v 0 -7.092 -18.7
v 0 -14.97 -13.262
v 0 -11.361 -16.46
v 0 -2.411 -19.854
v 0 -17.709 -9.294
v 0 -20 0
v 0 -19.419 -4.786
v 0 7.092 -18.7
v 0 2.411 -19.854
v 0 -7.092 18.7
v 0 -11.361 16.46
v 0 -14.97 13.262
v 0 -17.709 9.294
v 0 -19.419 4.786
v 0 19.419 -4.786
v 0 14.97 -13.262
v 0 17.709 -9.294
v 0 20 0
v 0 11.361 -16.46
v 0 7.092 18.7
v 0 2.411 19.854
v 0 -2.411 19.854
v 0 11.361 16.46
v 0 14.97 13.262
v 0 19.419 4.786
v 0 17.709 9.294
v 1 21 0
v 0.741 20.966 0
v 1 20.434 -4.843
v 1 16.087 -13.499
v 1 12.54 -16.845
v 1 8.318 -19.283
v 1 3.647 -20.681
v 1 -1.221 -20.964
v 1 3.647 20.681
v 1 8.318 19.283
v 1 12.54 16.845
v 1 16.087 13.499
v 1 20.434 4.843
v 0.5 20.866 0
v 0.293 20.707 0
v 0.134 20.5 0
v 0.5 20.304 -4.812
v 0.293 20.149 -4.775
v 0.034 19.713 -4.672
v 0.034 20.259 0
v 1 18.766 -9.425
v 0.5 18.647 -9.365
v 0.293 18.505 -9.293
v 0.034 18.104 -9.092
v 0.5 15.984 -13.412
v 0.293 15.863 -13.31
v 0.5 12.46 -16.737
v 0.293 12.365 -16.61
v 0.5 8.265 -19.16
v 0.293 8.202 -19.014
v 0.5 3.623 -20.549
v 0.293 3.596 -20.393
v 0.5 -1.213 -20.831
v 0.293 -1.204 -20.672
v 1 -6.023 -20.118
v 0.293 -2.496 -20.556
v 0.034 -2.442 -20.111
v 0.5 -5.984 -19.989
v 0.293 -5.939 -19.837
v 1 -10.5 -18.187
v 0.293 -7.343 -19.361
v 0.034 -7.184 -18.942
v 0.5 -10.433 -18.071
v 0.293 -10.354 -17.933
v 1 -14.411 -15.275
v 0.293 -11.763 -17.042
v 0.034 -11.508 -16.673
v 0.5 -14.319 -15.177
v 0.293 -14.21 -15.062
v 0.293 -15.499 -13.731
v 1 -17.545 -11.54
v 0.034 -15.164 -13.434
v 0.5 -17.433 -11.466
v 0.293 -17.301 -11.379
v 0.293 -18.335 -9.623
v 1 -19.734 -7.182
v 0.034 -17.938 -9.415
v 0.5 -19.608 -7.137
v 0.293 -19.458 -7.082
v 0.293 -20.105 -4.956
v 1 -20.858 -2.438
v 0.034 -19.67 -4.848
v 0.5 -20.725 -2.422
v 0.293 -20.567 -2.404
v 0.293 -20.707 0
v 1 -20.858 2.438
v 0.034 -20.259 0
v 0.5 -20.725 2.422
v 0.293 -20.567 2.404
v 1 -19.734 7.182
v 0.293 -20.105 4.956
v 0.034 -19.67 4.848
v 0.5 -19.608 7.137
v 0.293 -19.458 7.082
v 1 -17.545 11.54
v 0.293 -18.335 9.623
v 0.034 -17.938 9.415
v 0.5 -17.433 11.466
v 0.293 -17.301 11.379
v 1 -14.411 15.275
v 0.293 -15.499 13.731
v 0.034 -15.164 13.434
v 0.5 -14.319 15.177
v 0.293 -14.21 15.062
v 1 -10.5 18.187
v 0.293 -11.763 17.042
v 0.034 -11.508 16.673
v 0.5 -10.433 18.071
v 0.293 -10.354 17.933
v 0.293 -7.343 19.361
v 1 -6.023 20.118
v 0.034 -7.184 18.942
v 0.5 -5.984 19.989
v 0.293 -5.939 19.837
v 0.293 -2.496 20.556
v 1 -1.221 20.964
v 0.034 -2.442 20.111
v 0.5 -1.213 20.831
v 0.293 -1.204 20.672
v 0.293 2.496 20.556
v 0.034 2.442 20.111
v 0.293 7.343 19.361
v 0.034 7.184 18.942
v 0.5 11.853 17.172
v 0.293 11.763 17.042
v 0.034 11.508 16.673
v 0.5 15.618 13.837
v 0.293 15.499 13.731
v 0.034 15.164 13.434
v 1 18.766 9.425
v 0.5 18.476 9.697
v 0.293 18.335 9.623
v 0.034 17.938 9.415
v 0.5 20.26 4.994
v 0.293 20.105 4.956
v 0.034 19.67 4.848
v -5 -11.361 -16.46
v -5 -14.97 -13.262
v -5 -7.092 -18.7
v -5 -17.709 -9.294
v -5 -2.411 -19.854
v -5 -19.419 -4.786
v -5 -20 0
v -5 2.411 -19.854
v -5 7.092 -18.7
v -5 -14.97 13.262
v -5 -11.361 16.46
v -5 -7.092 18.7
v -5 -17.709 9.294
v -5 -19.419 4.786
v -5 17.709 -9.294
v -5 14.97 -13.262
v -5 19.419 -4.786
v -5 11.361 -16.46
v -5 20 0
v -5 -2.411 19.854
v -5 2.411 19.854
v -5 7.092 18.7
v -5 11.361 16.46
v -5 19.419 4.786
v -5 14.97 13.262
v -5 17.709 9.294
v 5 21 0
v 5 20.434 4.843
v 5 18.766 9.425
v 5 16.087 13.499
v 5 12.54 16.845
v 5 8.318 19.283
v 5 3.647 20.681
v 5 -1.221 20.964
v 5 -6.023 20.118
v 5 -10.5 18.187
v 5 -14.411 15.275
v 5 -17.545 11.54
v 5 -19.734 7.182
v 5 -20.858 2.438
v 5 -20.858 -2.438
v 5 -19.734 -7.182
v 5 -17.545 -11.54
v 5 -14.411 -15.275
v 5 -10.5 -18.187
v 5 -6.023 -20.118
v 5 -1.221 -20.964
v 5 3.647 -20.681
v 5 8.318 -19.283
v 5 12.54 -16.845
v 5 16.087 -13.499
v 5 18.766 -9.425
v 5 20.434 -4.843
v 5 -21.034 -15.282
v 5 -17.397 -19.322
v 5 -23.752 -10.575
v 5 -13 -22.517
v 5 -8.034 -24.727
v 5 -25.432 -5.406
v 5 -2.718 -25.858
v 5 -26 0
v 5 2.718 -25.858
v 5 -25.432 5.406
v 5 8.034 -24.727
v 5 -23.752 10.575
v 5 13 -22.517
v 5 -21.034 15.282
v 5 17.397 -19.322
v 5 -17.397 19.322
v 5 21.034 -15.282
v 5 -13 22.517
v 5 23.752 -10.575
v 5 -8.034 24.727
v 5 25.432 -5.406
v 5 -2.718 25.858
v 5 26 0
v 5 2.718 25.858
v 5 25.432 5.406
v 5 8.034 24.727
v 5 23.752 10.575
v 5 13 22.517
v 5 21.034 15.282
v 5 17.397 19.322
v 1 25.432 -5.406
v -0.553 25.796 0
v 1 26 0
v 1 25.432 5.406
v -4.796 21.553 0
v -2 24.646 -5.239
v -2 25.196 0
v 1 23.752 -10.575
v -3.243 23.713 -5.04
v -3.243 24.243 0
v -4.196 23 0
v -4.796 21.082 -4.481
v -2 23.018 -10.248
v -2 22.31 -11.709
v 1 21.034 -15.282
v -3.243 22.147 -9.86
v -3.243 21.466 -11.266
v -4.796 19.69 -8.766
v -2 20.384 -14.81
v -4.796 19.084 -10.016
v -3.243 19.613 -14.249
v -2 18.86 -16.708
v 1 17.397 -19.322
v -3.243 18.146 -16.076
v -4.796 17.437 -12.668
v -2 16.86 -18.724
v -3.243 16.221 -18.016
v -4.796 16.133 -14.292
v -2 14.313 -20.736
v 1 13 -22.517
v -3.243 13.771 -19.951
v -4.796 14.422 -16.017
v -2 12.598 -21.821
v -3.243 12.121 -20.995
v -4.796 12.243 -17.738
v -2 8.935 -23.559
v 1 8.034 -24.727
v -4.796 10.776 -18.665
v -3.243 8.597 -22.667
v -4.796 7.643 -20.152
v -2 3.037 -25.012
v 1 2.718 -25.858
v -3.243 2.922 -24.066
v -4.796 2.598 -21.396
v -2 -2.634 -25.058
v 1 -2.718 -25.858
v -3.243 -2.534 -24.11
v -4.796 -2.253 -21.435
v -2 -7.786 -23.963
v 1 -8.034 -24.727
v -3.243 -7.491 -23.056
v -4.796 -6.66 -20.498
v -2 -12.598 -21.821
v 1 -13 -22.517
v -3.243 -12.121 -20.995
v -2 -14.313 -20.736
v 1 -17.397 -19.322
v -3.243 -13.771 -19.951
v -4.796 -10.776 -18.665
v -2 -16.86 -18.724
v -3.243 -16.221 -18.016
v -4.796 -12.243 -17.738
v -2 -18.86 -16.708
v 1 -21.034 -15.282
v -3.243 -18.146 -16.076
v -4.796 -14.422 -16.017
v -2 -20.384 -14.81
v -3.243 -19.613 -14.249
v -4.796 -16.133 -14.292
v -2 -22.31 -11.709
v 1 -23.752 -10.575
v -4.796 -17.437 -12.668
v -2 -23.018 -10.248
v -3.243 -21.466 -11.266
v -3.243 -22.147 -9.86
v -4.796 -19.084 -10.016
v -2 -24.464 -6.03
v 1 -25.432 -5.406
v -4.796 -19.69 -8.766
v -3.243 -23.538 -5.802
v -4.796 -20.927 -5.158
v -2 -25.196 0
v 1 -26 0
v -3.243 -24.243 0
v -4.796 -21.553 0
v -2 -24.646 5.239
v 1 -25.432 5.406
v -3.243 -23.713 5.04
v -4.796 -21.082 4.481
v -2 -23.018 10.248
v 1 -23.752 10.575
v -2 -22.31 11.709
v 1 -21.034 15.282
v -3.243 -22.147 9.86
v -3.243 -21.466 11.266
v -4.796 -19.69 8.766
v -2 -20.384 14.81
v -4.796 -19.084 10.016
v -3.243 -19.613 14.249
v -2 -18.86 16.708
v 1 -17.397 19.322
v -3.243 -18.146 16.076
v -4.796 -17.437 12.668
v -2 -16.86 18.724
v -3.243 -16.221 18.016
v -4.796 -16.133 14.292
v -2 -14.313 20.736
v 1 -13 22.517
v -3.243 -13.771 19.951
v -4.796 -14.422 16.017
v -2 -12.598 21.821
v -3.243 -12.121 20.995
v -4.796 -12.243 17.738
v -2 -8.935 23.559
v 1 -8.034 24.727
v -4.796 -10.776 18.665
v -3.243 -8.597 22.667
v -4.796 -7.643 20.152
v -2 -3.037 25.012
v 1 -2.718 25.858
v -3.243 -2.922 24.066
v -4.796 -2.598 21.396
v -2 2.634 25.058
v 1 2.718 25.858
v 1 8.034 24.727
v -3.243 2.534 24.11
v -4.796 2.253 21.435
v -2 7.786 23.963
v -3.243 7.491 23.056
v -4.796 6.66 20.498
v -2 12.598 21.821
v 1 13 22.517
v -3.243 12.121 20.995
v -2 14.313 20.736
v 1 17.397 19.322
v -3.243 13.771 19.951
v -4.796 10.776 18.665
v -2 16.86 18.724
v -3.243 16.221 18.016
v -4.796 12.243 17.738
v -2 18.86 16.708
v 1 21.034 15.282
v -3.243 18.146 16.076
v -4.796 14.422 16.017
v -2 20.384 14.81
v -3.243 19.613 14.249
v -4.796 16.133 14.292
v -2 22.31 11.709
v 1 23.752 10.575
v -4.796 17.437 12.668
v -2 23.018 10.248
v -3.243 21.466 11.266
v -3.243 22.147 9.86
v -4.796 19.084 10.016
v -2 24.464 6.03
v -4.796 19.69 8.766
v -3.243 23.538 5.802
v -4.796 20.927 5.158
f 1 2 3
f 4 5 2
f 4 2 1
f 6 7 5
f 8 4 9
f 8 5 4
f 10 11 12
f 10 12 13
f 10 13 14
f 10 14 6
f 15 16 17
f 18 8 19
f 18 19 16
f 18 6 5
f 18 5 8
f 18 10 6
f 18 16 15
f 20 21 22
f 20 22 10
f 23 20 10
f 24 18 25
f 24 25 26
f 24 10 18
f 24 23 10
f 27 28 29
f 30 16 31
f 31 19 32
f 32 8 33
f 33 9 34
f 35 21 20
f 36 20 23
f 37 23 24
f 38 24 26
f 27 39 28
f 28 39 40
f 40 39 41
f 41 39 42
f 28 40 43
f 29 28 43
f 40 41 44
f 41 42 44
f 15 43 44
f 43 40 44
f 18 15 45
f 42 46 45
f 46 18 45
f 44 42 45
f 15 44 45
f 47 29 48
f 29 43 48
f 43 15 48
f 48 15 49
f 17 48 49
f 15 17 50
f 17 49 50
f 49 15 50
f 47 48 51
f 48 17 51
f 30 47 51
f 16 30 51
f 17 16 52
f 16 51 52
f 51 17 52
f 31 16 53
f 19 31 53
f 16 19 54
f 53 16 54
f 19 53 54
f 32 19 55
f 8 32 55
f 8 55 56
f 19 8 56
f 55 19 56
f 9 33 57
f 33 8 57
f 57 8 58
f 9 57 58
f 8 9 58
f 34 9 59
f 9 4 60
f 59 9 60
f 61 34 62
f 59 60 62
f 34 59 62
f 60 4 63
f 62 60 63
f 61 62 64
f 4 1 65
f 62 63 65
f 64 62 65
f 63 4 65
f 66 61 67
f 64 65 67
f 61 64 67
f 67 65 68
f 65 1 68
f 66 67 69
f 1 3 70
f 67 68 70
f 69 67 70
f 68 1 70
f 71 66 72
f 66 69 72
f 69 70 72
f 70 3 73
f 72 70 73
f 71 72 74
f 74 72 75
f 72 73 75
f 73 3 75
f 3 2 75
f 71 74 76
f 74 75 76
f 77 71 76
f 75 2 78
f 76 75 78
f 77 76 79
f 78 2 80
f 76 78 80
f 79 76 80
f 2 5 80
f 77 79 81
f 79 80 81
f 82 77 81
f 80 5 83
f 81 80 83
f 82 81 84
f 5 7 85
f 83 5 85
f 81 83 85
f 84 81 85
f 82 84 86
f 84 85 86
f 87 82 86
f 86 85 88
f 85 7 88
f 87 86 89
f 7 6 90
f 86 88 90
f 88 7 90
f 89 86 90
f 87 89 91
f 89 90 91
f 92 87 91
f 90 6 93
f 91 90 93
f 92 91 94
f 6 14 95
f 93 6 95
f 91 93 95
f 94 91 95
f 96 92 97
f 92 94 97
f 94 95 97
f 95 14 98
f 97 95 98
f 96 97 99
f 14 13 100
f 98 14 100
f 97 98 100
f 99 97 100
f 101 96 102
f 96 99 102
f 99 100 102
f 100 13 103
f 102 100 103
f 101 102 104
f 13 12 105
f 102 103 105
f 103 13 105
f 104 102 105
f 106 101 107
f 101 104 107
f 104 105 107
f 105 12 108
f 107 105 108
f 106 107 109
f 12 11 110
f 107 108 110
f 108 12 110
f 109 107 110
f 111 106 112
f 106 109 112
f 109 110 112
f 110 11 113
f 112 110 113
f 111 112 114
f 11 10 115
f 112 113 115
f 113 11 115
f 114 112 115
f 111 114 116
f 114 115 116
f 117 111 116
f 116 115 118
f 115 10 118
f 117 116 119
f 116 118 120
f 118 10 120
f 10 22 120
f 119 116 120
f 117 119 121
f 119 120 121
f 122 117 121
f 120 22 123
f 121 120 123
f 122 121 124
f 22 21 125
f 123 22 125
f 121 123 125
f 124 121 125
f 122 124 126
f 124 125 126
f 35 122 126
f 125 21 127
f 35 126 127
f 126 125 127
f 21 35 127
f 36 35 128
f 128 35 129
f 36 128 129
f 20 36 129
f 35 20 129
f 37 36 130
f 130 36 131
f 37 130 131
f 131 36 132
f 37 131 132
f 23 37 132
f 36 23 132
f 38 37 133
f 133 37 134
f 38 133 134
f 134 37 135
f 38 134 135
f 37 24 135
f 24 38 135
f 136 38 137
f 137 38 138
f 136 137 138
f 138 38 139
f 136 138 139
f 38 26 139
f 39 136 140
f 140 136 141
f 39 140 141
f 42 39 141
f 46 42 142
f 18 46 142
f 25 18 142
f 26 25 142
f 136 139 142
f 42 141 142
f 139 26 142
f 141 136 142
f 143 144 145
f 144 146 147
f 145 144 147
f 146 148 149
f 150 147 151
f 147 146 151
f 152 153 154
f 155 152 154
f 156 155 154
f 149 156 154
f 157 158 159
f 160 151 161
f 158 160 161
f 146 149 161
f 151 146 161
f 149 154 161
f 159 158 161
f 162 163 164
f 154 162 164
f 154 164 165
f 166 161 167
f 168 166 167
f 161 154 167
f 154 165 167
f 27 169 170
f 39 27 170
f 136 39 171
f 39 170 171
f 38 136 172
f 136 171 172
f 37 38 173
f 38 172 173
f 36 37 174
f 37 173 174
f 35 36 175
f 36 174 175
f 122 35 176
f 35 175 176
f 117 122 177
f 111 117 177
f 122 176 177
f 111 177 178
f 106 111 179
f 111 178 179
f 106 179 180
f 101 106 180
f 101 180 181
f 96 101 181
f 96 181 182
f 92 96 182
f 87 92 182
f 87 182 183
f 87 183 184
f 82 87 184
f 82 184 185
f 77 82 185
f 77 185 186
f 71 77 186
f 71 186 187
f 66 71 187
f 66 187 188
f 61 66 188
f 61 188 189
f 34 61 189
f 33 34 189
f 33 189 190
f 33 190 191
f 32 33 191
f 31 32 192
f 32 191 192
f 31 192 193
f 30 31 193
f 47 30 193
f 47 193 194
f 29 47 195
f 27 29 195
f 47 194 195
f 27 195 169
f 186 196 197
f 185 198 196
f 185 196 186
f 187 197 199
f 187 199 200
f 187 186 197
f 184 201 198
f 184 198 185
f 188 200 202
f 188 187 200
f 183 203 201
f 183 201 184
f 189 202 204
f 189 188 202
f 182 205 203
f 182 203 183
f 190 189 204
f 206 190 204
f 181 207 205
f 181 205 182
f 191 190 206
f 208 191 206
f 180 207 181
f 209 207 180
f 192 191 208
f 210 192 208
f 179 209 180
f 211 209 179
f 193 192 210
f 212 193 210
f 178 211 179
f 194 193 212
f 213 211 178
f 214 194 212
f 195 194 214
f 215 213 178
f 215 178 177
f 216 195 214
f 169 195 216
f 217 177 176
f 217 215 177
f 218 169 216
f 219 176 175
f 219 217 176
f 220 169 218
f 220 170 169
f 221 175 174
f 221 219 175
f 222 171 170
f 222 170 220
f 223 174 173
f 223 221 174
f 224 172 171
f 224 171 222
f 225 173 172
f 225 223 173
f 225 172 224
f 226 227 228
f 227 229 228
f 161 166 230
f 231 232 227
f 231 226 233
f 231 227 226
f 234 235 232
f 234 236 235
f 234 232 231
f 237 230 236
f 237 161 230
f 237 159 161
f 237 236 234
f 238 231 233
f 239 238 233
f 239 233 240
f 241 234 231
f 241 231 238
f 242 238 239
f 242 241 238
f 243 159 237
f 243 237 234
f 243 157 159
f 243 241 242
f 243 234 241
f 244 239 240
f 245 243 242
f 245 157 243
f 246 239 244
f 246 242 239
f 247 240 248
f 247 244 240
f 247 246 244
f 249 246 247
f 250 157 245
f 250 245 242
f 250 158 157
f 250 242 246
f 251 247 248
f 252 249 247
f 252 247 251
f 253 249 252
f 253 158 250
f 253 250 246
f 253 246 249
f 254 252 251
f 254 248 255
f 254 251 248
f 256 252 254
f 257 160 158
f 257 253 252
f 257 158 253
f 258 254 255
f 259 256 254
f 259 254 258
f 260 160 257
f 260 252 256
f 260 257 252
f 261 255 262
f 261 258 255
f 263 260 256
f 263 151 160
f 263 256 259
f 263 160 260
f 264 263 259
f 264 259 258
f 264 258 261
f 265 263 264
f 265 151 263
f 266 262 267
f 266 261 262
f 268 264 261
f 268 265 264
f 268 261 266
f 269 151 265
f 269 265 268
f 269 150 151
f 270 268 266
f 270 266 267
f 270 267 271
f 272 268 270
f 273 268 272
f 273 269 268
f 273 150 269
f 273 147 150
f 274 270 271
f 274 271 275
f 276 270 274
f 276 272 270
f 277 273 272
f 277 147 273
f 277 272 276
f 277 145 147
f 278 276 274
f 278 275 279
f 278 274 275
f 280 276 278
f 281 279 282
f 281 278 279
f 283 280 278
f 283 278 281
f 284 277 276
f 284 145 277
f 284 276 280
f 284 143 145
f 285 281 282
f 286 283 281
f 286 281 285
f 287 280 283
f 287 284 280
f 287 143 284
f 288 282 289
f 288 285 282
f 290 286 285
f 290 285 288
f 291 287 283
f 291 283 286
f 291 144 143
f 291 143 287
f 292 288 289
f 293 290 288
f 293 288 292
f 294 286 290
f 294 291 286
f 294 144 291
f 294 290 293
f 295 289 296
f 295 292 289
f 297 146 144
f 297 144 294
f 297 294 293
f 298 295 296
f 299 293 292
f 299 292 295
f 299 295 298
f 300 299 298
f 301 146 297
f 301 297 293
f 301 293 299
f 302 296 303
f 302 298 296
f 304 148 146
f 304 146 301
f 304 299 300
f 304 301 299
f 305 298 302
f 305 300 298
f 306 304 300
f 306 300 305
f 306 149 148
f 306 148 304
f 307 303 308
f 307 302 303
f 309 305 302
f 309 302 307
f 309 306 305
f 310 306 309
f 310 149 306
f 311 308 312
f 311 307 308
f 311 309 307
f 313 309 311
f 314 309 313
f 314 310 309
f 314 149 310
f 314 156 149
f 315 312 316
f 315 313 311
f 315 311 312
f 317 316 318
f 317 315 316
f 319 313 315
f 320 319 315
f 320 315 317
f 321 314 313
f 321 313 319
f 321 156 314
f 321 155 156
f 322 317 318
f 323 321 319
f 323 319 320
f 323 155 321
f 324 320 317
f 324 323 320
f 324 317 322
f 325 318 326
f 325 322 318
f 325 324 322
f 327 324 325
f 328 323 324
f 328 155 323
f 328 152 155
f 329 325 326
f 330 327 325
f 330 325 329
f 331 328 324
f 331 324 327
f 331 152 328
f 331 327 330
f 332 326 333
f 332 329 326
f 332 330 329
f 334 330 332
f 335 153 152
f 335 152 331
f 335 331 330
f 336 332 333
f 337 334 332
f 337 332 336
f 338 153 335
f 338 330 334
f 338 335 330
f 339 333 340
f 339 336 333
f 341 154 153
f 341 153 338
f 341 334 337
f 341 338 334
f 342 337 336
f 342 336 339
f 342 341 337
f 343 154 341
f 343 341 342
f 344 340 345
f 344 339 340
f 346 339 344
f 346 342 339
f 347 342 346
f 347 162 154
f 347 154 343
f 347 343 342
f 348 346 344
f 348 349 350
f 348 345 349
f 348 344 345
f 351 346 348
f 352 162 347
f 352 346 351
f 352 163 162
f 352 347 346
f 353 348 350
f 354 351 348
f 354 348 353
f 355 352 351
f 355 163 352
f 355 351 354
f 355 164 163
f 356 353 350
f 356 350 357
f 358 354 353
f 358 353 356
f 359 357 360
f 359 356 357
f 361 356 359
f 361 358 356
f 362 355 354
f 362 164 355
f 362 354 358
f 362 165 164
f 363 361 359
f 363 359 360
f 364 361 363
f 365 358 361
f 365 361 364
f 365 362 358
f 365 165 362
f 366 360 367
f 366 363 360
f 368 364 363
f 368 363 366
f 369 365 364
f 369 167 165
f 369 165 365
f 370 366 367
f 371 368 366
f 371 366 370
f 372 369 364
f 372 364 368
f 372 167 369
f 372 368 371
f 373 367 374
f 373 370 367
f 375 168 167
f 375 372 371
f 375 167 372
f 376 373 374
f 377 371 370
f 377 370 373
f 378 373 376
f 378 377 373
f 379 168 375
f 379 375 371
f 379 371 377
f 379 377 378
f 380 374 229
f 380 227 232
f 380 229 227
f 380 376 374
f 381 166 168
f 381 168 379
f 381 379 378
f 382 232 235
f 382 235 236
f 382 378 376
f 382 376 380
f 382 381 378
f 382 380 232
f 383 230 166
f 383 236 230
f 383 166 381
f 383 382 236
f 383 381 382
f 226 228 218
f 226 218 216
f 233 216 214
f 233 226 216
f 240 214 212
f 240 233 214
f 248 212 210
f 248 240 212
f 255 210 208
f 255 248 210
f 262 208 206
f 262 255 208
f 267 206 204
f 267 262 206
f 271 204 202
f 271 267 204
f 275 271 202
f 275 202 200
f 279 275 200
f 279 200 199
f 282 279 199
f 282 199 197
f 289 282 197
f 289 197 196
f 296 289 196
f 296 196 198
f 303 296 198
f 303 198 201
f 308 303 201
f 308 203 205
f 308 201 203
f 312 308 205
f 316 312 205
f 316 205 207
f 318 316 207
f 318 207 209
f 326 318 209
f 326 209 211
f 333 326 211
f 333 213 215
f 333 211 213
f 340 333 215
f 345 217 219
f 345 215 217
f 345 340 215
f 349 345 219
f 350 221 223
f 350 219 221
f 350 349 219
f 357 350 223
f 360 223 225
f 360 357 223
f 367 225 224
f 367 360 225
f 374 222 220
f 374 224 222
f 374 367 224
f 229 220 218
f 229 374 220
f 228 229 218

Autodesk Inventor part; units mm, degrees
ref_plane "YZ Plane" through (0, 0, 0) normal (1, 0, 0) x (0, 1, 0)
ref_plane "XZ Plane" through (0, 0, 0) normal (0, 1, 0) x (-1, 0, 0)
ref_plane "XY Plane" through (0, 0, 0) normal (0, 0, 1) x (1, 0, 0)
sketch "Эскиз1" plane through (0, 0, 0) normal (0, 0, 1) x (1, 0, 0)
  line L0 (0, 0) -> (28.3511, 0) construction
  line L1 (0, 20) -> (0, 0)
  line L2 (1, 21) -> (5, 21)
  arc A0 (1, 21) -> (0, 20) centre (1, 20) ccw
  line L3 (5, 26) -> (1, 26)
  arc A1 (1, 26) -> (-5, 20) centre (1, 20) ccw
  line L4 (-5, 20) -> (-5, 0)
  line L5 (-5, 0) -> (3.5853, 0) construction
  line L6 (5, 26) -> (5, 21)
  line L7 (-5, 0) -> (0, 0)
  dimension "d0" = 42
  dimension "d1" = 1
  dimension "d2" = 5
  dimension "d3" = 52
  dimension "d5" = 10
revolve "Вращение1" add sketch "Эскиз1" angle 360 about axis through (0, 0, 0) along (1, 0, 0)
properties part number "Регулировка"
